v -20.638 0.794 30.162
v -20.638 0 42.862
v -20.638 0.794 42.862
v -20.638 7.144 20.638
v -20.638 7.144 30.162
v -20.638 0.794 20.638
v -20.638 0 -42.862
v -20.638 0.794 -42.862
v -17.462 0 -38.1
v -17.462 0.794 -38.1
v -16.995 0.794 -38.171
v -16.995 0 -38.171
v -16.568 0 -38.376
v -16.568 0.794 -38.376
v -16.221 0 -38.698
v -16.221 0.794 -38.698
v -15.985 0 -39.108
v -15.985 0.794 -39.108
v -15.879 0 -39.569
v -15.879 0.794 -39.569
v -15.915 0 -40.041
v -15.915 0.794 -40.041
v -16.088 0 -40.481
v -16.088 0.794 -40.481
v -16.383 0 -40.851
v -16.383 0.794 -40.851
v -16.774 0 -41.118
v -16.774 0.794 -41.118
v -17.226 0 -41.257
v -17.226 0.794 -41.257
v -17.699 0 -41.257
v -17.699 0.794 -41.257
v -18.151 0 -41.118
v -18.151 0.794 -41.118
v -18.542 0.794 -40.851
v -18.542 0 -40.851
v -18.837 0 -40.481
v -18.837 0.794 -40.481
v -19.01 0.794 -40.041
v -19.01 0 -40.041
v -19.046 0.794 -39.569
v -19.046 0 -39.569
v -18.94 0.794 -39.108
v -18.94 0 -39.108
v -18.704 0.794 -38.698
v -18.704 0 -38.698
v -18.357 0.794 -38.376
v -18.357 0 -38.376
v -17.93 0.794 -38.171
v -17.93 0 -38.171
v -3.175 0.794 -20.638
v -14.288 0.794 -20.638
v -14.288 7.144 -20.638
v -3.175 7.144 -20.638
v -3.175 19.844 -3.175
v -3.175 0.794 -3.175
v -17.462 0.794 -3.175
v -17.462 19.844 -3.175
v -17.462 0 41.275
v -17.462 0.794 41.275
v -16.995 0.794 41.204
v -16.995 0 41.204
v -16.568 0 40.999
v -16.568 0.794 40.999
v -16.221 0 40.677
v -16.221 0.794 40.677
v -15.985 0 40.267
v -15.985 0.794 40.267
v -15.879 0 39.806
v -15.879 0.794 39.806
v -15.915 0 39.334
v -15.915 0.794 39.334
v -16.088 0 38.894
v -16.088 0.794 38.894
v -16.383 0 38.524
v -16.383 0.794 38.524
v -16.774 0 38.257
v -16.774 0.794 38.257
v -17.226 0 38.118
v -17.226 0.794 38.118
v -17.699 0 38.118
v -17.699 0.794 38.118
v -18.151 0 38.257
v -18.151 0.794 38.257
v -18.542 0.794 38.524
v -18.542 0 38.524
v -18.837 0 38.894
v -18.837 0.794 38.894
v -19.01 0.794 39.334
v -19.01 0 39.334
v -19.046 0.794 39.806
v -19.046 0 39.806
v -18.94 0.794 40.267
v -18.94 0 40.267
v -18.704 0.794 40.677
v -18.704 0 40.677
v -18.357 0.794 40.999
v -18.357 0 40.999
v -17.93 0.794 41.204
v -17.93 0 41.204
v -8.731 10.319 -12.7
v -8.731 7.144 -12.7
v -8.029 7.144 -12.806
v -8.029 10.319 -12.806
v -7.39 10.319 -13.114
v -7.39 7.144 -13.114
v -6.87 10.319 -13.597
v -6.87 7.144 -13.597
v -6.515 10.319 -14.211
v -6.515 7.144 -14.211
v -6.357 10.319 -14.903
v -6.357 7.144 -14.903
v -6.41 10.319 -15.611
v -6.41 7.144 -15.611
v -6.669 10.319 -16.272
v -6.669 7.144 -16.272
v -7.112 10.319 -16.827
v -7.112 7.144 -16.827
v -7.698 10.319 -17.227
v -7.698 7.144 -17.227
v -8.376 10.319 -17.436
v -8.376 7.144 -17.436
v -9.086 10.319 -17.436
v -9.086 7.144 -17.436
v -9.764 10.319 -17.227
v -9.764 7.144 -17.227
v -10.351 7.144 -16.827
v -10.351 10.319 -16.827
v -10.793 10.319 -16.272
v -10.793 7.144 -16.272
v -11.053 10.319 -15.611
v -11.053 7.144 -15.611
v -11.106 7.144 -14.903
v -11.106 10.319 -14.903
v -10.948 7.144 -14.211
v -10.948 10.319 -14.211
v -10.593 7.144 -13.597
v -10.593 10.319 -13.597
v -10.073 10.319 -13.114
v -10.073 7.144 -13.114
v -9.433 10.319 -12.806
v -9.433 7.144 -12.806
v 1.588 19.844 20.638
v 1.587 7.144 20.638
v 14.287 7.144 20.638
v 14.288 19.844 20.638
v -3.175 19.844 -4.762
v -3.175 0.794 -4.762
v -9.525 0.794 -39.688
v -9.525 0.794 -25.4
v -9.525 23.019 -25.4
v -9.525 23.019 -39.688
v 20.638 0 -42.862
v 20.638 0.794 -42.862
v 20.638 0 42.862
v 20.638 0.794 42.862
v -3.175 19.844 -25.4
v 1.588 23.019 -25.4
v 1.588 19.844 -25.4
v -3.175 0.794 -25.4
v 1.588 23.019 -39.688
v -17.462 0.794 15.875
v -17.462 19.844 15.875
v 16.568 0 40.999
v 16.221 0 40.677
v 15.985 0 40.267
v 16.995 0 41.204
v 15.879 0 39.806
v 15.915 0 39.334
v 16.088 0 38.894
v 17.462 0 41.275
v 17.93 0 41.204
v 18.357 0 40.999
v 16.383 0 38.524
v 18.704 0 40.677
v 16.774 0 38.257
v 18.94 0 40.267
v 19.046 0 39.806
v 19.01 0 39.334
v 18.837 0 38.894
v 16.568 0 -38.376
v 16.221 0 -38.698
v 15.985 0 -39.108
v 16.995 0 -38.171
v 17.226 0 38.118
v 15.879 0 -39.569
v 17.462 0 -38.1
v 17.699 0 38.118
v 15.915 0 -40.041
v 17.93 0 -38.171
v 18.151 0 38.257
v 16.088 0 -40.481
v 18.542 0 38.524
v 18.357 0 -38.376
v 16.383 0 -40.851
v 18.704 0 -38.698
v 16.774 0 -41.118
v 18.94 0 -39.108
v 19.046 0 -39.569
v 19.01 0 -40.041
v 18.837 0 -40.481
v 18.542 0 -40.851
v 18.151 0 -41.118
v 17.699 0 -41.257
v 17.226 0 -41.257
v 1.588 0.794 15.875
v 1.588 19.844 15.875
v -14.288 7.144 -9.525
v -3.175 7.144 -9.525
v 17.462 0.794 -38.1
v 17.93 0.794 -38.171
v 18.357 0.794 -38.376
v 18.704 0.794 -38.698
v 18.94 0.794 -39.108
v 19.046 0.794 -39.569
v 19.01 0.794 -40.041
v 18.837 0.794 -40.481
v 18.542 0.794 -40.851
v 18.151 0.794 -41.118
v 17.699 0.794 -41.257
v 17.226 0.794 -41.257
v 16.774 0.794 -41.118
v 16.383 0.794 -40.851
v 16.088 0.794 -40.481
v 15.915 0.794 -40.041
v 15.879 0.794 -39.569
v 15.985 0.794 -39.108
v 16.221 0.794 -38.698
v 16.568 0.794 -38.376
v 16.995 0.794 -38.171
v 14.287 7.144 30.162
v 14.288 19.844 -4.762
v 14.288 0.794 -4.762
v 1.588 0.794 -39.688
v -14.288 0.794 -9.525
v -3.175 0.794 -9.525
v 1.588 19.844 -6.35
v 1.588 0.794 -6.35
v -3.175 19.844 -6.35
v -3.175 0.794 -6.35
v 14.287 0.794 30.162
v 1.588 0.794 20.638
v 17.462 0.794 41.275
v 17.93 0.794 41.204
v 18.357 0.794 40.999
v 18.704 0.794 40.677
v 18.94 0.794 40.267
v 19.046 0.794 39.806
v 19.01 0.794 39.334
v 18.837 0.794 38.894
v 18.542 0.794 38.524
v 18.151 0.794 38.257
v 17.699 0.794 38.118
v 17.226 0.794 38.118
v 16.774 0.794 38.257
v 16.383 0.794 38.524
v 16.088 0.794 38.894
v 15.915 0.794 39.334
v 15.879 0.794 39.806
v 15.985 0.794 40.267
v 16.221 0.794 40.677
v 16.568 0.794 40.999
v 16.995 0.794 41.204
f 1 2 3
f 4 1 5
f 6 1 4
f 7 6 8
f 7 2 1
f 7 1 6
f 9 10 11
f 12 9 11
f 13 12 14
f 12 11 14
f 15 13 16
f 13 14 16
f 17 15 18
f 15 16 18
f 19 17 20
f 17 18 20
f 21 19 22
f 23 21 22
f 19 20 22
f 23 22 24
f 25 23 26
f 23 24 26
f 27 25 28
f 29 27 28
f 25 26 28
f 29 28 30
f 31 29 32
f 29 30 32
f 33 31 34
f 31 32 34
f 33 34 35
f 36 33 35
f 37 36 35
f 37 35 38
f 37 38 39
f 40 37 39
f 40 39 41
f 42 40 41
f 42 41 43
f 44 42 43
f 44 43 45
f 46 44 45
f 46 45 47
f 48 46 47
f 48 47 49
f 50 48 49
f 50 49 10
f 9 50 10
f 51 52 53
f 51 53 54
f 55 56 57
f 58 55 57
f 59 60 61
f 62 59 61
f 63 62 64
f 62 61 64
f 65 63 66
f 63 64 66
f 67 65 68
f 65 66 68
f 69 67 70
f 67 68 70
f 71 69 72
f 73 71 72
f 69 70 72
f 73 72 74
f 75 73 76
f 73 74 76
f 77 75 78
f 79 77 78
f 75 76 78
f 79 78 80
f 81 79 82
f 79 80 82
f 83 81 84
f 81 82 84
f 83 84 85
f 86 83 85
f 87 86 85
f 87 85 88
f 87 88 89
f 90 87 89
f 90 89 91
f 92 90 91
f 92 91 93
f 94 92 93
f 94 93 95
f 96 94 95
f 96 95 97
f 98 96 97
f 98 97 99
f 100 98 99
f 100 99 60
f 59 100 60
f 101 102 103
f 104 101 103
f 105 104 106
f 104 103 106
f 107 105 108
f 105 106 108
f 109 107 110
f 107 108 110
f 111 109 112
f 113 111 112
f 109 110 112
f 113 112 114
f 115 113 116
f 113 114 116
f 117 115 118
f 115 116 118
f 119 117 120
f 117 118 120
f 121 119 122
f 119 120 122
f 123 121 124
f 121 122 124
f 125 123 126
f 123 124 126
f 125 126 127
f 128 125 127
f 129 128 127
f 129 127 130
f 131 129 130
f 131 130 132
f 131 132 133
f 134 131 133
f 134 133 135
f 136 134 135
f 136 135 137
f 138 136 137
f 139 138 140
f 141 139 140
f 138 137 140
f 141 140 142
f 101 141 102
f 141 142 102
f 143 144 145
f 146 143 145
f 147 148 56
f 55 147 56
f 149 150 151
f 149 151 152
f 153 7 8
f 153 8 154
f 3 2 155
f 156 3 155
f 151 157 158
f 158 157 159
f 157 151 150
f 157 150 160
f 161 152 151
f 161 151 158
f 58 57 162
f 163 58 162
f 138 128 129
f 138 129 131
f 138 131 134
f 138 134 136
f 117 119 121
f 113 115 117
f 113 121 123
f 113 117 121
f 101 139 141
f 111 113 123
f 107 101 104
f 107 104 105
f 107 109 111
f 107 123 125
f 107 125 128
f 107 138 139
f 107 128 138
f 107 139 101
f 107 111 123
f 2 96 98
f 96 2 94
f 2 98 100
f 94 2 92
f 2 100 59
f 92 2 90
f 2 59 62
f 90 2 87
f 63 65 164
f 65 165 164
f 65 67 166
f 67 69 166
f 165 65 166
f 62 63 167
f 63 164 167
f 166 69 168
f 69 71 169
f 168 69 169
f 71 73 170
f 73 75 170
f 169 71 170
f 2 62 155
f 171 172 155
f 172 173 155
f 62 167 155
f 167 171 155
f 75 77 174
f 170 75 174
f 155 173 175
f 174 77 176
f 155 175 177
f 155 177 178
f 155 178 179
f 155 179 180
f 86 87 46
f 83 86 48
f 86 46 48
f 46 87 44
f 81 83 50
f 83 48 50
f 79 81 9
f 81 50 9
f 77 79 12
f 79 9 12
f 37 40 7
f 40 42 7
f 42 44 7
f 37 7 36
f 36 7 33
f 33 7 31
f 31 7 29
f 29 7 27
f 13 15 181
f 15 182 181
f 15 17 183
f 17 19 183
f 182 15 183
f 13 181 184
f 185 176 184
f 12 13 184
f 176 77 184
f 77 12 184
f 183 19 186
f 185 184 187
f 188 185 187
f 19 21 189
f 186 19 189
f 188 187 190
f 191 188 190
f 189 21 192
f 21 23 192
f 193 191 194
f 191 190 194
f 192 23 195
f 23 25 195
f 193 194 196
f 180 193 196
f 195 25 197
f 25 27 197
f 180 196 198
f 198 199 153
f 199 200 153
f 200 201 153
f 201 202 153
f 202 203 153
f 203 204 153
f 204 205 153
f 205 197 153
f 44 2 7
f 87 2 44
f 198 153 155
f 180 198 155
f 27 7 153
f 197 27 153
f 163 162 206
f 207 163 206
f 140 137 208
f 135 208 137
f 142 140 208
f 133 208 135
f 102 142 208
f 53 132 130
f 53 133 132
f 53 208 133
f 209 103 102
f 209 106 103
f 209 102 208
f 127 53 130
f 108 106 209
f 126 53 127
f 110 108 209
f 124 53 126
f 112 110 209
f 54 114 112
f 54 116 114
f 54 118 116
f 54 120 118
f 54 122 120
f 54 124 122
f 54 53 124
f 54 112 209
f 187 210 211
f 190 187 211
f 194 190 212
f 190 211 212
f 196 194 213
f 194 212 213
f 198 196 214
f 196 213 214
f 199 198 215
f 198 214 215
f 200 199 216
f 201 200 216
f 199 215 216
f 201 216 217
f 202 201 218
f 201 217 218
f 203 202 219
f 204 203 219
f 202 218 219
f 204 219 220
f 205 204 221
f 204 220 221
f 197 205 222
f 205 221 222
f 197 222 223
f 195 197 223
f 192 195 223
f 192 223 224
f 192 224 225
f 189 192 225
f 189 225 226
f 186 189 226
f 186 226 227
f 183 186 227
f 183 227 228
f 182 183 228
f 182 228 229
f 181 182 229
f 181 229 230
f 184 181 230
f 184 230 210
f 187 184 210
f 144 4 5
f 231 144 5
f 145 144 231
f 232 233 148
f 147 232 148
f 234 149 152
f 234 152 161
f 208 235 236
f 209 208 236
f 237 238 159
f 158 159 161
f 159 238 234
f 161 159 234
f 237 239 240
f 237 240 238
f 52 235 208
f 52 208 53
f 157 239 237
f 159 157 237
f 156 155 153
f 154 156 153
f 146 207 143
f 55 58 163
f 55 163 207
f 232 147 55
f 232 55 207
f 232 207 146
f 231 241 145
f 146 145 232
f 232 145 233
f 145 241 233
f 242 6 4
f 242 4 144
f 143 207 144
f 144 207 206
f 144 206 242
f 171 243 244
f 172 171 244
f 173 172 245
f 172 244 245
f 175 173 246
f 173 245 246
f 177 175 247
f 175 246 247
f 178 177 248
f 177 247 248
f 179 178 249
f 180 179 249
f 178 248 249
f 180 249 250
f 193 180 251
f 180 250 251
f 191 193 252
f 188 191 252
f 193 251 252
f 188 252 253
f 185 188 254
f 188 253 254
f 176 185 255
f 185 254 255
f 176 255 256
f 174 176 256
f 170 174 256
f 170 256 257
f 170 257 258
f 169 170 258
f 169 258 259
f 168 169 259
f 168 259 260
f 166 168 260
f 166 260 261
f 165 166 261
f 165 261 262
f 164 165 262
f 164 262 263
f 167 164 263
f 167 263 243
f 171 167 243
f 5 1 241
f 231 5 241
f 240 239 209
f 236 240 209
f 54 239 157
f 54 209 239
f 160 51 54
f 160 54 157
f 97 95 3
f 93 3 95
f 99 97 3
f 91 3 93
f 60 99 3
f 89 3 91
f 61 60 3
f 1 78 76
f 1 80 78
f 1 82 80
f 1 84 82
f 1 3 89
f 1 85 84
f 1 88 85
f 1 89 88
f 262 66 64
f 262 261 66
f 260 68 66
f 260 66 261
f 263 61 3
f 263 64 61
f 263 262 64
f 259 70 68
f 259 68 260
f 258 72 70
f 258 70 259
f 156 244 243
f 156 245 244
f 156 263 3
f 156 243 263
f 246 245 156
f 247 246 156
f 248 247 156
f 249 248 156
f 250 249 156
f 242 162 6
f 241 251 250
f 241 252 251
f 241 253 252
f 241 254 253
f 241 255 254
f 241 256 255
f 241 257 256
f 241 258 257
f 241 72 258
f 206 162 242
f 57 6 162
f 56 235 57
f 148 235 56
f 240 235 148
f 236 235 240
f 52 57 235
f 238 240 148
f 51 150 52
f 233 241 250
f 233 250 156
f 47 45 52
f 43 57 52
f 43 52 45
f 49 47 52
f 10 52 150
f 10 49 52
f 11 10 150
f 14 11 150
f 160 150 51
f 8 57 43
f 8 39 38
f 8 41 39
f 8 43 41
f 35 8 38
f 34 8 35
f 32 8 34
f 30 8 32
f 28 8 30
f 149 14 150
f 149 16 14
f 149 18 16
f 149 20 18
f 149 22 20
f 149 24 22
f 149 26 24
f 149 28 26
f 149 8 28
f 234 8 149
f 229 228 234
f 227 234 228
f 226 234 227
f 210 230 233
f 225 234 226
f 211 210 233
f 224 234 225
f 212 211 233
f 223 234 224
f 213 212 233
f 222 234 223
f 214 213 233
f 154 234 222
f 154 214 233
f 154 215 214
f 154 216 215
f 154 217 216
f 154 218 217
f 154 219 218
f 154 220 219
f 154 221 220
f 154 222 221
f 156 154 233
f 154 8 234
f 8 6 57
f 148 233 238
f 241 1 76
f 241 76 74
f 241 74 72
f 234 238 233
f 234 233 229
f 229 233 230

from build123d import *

# Parameters (mm, degrees)
SKETCH1_W           = 41.275
SKETCH1_H           = 85.725
BOSS_EXTRUDE1_DEPTH = 0.79375
SKETCH2_W           = 34.925
SKETCH2_H           = 9.525
BOSS_EXTRUDE2_DEPTH = 6.35
BOSS_EXTRUDE3_DEPTH = 19.05
SKETCH4_W           = 11.1125
SKETCH4_H           = 11.1125
BOSS_EXTRUDE4_DEPTH = 6.35
SKETCH5_R           = 2.38125
BOSS_EXTRUDE5_DEPTH = 3.175
SKETCH6_W           = 4.7625
SKETCH6_H           = 19.05
BOSS_EXTRUDE6_DEPTH = 19.05
SKETCH7_W           = 11.1125
SKETCH7_H           = 14.2875
BOSS_EXTRUDE7_DEPTH = 22.225
SKETCH8_R           = 1.5875
CUT_EXTRUDE1_DEPTH  = 53.507627422


with BuildPart() as part:
    # Sketch1 → Boss-Extrude1 (new body)
    with BuildSketch(Plane(origin=(0, 0, 0), x_dir=(1, 0, 0), z_dir=(0, 1, 0))):
        Rectangle(SKETCH1_W, SKETCH1_H)
    extrude(amount=BOSS_EXTRUDE1_DEPTH)

    # Sketch2 → Boss-Extrude2 (add)
    with BuildSketch(Plane(origin=(0, 0.79375, 0), x_dir=(1, 0, 0), z_dir=(0, 1, 0))):
        with Locations((-3.175, -25.4)):
            Rectangle(SKETCH2_W, SKETCH2_H)
    extrude(amount=BOSS_EXTRUDE2_DEPTH)

    # Sketch3 → Boss-Extrude3 (add)
    with BuildSketch(Plane(origin=(0, 0.79375, 0), x_dir=(1, 0, 0), z_dir=(0, 1, 0))):
        Polygon((14.2875, -20.6375), (14.2875, 4.7625), (-3.175, 4.7625), (-3.175, 3.175), (-17.4625, 3.175), (-17.4625, -15.875), (1.5875, -15.875), (1.5875, -20.6375), align=None)
    extrude(amount=BOSS_EXTRUDE3_DEPTH)

    # Sketch4 → Boss-Extrude4 (add)
    with BuildSketch(Plane(origin=(0, 0.79375, 0), x_dir=(1, 0, 0), z_dir=(0, 1, 0))):
        with Locations((-8.73125, 15.08125)):
            Rectangle(SKETCH4_W, SKETCH4_H)
    extrude(amount=BOSS_EXTRUDE4_DEPTH)

    # Sketch5 → Boss-Extrude5 (add)
    with BuildSketch(Plane(origin=(0, 7.14375, 0), x_dir=(1, 0, 0), z_dir=(0, 1, 0))):
        with Locations(Location((-8.73125, 15.08125, 0), (0, 0, 270))):
            Circle(SKETCH5_R)
    extrude(amount=BOSS_EXTRUDE5_DEPTH)

    # Sketch6 → Boss-Extrude6 (add)
    with BuildSketch(Plane(origin=(0, 0.79375, 0), x_dir=(1, 0, 0), z_dir=(0, 1, 0))):
        with Locations((-0.79375, 15.875)):
            Rectangle(SKETCH6_W, SKETCH6_H)
    extrude(amount=BOSS_EXTRUDE6_DEPTH)

    # Sketch7 → Boss-Extrude7 (add)
    with BuildSketch(Plane(origin=(0, 0.79375, 0), x_dir=(1, 0, 0), z_dir=(0, 1, 0))):
        with Locations((-3.96875, 32.54375)):
            Rectangle(SKETCH7_W, SKETCH7_H)
    extrude(amount=BOSS_EXTRUDE7_DEPTH)

    # Sketch8 → Cut-Extrude1 (cut, through all)
    with BuildSketch(Plane(origin=(0, 0.79375, 0), x_dir=(1, 0, 0), z_dir=(0, 1, 0))):
        with Locations(Location((-17.4625, 39.6875, 0), (0, 0, 270))):
            Circle(SKETCH8_R)
        with Locations(Location((17.4625, 39.6875, 0), (0, 0, 270))):
            Circle(SKETCH8_R)
        with Locations(Location((-17.4625, -39.6875, 0), (0, 0, 270))):
            Circle(SKETCH8_R)
        with Locations(Location((17.4625, -39.6875, 0), (0, 0, 270))):
            Circle(SKETCH8_R)
    extrude(amount=-CUT_EXTRUDE1_DEPTH, mode=Mode.SUBTRACT)


solid = part.part
